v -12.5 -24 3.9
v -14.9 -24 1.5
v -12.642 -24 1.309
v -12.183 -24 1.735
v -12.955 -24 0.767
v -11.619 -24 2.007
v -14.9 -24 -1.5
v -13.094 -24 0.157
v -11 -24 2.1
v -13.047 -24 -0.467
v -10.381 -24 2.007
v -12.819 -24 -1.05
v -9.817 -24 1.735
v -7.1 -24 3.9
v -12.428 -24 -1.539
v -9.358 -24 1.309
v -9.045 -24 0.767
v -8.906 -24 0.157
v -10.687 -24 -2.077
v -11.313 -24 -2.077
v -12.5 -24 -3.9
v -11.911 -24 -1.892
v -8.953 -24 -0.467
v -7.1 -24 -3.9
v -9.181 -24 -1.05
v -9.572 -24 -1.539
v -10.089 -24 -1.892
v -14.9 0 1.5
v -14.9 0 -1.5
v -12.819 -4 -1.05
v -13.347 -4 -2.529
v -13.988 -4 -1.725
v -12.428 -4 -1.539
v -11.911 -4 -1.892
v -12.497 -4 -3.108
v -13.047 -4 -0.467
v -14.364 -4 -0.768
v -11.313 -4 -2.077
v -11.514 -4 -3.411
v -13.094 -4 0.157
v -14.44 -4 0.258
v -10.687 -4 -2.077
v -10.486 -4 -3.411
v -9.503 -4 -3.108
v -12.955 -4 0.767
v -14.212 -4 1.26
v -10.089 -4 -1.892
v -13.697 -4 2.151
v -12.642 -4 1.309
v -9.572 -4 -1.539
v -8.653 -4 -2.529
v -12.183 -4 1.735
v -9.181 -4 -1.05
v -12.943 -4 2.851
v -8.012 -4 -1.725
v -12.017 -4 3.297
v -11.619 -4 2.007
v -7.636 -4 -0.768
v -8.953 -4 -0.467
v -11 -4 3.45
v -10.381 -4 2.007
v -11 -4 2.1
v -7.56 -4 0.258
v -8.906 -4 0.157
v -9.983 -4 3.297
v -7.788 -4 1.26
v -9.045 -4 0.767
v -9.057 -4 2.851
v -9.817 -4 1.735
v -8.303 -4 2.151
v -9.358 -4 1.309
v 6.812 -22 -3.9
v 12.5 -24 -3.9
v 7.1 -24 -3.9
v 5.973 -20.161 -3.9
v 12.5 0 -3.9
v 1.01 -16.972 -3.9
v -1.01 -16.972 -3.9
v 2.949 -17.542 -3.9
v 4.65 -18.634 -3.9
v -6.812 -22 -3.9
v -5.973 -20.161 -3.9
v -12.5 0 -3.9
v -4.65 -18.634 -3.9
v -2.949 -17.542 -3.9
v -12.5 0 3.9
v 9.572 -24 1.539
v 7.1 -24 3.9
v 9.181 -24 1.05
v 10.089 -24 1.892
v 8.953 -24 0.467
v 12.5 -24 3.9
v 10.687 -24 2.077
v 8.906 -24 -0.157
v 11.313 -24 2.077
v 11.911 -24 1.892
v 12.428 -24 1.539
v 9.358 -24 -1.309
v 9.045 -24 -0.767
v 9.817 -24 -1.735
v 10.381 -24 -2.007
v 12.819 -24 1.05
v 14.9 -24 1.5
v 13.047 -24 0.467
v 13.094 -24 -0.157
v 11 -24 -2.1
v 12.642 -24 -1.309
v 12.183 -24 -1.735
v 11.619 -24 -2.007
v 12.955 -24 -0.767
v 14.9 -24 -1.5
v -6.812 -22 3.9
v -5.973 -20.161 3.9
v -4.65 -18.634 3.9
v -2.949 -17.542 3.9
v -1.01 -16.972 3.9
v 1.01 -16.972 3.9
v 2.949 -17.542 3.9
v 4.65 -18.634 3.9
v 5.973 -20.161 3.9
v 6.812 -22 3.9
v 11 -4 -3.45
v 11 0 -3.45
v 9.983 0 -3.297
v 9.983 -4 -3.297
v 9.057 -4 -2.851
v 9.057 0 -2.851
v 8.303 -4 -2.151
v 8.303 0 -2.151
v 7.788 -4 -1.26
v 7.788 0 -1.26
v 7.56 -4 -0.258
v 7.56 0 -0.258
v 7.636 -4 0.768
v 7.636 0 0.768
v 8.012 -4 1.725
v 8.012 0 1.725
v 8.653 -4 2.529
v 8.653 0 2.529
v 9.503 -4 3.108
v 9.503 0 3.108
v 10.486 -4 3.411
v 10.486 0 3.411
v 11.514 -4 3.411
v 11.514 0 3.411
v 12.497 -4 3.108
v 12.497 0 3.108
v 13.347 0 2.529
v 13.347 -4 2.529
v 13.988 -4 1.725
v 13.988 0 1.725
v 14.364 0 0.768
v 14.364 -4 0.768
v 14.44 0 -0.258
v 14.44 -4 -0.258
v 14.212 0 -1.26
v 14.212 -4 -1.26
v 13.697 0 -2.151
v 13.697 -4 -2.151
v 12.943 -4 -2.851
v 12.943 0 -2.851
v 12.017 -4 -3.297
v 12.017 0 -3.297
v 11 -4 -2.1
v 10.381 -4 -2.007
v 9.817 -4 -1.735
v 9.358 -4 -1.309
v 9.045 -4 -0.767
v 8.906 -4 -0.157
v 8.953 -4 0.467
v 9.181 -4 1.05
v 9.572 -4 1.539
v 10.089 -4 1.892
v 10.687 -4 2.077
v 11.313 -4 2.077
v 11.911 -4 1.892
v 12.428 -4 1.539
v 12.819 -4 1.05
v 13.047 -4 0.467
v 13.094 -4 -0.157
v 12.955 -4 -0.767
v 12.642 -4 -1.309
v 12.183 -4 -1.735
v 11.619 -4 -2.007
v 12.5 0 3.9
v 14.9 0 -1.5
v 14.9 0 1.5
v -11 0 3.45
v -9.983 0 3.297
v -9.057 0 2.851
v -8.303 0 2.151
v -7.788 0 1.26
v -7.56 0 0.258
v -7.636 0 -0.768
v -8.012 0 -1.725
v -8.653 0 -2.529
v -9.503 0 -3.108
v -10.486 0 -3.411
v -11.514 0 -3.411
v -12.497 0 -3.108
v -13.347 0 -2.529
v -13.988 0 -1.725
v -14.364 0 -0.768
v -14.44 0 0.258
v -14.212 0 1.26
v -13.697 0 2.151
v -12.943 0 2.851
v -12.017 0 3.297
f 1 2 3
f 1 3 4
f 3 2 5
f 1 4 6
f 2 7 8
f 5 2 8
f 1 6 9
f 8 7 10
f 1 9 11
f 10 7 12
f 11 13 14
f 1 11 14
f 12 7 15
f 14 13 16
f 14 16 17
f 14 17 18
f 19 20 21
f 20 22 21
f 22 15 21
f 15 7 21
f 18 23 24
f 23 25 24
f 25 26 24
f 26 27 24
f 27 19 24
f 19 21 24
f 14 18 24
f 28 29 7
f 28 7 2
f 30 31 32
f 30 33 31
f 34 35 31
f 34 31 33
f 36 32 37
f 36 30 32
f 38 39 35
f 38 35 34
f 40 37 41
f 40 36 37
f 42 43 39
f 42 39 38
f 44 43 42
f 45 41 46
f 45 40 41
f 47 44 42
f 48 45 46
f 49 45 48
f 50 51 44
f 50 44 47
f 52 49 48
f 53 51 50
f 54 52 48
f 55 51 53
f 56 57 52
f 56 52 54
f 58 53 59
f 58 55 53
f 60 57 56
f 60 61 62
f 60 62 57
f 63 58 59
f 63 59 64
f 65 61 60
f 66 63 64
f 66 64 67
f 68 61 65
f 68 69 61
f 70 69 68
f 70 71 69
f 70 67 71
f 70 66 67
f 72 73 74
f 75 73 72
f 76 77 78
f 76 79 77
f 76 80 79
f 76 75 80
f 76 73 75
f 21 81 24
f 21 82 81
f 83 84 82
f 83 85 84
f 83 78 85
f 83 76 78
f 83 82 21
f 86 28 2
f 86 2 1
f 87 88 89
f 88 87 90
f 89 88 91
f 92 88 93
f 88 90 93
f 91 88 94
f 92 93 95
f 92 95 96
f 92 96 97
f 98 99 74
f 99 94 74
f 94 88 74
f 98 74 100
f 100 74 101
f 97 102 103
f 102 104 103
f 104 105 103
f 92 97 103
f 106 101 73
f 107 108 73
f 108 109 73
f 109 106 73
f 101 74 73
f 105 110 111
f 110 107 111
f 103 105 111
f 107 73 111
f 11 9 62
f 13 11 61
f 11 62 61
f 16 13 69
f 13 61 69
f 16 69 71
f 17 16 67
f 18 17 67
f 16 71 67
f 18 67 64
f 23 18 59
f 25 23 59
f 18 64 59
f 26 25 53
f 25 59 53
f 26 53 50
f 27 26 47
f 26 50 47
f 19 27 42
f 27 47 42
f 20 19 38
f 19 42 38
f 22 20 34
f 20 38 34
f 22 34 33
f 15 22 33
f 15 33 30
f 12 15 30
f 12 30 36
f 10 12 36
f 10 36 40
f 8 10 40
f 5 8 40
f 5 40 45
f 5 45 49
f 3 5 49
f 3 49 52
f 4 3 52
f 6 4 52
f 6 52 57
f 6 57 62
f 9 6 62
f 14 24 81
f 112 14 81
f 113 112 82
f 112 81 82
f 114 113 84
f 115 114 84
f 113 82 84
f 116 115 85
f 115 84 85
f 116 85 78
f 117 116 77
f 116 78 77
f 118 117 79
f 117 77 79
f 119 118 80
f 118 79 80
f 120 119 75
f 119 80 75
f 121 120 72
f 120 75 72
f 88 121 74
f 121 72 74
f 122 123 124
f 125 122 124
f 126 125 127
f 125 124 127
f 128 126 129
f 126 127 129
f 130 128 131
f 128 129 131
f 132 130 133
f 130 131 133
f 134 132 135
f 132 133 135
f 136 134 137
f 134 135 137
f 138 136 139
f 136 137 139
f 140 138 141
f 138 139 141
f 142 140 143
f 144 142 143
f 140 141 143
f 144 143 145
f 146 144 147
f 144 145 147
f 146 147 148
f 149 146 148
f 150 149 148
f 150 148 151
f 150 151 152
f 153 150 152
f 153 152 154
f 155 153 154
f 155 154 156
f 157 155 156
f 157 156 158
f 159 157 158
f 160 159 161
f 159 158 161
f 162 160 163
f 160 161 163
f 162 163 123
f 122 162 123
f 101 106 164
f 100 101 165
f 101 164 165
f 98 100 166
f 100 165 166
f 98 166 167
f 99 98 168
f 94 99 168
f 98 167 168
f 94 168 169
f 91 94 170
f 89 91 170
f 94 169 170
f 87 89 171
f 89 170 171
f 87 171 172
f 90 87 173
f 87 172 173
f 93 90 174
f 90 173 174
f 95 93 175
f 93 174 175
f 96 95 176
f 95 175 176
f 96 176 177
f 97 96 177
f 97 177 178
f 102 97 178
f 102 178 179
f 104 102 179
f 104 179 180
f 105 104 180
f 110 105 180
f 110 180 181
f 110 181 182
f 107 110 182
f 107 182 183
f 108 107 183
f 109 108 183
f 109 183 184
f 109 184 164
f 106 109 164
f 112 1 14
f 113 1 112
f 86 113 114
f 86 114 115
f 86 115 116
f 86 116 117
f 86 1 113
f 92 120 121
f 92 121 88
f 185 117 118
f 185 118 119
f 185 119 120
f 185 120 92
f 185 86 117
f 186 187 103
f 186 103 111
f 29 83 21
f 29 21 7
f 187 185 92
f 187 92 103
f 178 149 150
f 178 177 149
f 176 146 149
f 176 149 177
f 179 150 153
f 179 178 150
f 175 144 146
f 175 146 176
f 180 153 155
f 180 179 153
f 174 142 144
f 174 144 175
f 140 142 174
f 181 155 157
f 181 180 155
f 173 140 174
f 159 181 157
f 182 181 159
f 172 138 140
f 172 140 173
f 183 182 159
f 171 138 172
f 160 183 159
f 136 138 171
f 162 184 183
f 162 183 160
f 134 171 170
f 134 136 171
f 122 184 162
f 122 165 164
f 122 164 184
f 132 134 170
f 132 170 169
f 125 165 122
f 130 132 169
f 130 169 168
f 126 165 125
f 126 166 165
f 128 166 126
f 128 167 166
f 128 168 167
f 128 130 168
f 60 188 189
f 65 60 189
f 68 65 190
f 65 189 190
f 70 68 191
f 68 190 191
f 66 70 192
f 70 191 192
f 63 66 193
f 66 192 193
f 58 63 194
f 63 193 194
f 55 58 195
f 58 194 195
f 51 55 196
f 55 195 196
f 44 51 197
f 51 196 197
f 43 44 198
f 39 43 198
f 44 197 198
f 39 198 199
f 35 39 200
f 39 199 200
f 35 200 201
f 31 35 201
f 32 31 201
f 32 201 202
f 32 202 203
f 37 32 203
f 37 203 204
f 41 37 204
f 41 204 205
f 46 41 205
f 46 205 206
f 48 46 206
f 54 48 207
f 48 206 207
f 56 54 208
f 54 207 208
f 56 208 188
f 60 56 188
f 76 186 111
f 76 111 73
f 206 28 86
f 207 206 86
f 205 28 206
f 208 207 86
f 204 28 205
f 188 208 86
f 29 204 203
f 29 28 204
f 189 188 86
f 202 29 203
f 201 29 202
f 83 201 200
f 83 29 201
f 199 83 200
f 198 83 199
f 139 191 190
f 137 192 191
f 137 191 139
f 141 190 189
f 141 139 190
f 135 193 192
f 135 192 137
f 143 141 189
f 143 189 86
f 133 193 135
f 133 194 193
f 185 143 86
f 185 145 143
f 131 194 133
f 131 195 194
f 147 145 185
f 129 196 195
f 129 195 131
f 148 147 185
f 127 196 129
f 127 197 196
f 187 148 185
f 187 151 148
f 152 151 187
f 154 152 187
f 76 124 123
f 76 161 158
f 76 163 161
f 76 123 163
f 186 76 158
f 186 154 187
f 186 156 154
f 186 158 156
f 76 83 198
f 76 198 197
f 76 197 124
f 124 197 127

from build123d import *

# Parameters (mm, degrees)
SZKIC1_R                    = 2.1
DODANIE_WYCI_GNI_CIE1_DEPTH = 24
WYTNIJ_WYCI_GNI_CIE1_REACH  = 31.306
SZKIC3_R                    = 3.45
WYTNIJ_WYCI_GNI_CIE2_DEPTH  = 4


with BuildPart() as part:
    # Szkic1 → Dodanie-wyciągnięcie1 (new body)
    with BuildSketch(Plane(origin=(0, 0, 0), x_dir=(1, 0, 0), z_dir=(0, 1, 0))):
        Polygon((12.5, 3.9), (-12.5, 3.9), (-14.9, 1.5), (-14.9, -1.5), (-12.5, -3.9), (12.5, -3.9), (14.9, -1.5), (14.9, 1.5), align=None)
        with Locations(Location((-11, 0, 0), (0, 0, 270))):
            Circle(SZKIC1_R, mode=Mode.SUBTRACT)
        with Locations(Location((11, 0, 0), (0, 0, 90))):
            Circle(SZKIC1_R, mode=Mode.SUBTRACT)
    extrude(amount=-DODANIE_WYCI_GNI_CIE1_DEPTH)

    # Szkic2 → Wytnij-wyciągnięcie1 (cut, up to next)
    with BuildSketch(Plane(origin=(0, 0, -3.9), x_dir=(-1, 0, 0), z_dir=(0, 0, -1)), mode=Mode.PRIVATE) as wytnij_wyci_gni_cie1_sk1:
        with BuildLine():
            Line((-7.1, -24), (7.1, -24))
            ThreePointArc((7.1, -24), (0, -16.9), (-7.1, -24))
        make_face()
    wytnij_wyci_gni_cie1_tool1 = extrude(wytnij_wyci_gni_cie1_sk1.sketch, amount=-WYTNIJ_WYCI_GNI_CIE1_REACH, mode=Mode.PRIVATE) & part.part
    add(wytnij_wyci_gni_cie1_tool1.solids().sort_by_distance((0, -20.986666, -3.9))[0], mode=Mode.SUBTRACT)

    # Szkic3 → Wytnij-wyciągnięcie2 (cut)
    with BuildSketch(Plane(origin=(0, 0, 0), x_dir=(1, 0, 0), z_dir=(0, 1, 0))):
        with Locations(Location((-11, 0, 0), (0, 0, 270))):
            Circle(SZKIC3_R)
        with Locations(Location((11, 0, 0), (0, 0, 90))):
            Circle(SZKIC3_R)
    extrude(amount=-WYTNIJ_WYCI_GNI_CIE2_DEPTH, mode=Mode.SUBTRACT)


solid = part.part
